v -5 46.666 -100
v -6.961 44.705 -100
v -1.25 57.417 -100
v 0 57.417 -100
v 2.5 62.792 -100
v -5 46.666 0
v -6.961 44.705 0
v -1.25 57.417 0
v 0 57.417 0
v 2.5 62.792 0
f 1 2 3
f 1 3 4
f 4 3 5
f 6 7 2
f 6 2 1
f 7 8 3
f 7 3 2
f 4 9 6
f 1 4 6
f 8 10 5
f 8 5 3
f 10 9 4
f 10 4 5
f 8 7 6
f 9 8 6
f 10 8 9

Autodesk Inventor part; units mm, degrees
ref_plane "YZ Plane" through (0, 0, 0) normal (1, 0, 0) x (0, 1, 0)
ref_plane "XZ Plane" through (0, 0, 0) normal (0, 1, 0) x (-1, 0, 0)
ref_plane "XY Plane" through (0, 0, 0) normal (0, 0, 1) x (1, 0, 0)
sketch "Sketch1" plane through (0, 0, 0) normal (0, 0, 1) x (1, 0, 0)
  line L0 (0, 57.4166) -> (-5, 46.6664) projected
  line L1 (-5, 42.7444) -> (-5, 46.6664) projected
  line L2 (-5, 42.7444) -> (-29.7, 18.0444) projected
  line L3 (-29.7, 18.0444) -> (-29.7, -5.3095) projected
  arc A0 (-5, 0) -> (-29.7, -5.3095) centre (-13.6, -20.1) ccw projected
  line L4 (0, 0) -> (-5, 0) projected
  line L5 (0, 0) -> (0, 57.4166) projected
  circle A1 centre (-13.6, -20.1) radius 16.1 projected
  line L6 (2.5, -20.1) -> (2.5, 68.8205)
  line L7 (-13.6, -36.2) -> (-13.6, 63.8)
  line L8 (-13.6, 63.8) -> (7.5508, 63.8)
  line L9 (-5, 46.6664) -> (2.5, 62.7917)
  line L10 (2.5, 62.7917) -> (-1.25, 57.4166)
  line L11 (-1.25, 57.4166) -> (-6.961, 44.7054)
  line L12 (-6.961, 44.7054) -> (-5, 46.6664)
  dimension "d0" = 100
extrude "Extrusion1" add sketch "Sketch1" against normal blind 100 contours L0 L12 L11 L10 L9
ref_plane "Work Plane1" through (-5, 15.8, -50) normal (-1, 0, 0) x (0, 0, 1)
properties part number "nóż"
